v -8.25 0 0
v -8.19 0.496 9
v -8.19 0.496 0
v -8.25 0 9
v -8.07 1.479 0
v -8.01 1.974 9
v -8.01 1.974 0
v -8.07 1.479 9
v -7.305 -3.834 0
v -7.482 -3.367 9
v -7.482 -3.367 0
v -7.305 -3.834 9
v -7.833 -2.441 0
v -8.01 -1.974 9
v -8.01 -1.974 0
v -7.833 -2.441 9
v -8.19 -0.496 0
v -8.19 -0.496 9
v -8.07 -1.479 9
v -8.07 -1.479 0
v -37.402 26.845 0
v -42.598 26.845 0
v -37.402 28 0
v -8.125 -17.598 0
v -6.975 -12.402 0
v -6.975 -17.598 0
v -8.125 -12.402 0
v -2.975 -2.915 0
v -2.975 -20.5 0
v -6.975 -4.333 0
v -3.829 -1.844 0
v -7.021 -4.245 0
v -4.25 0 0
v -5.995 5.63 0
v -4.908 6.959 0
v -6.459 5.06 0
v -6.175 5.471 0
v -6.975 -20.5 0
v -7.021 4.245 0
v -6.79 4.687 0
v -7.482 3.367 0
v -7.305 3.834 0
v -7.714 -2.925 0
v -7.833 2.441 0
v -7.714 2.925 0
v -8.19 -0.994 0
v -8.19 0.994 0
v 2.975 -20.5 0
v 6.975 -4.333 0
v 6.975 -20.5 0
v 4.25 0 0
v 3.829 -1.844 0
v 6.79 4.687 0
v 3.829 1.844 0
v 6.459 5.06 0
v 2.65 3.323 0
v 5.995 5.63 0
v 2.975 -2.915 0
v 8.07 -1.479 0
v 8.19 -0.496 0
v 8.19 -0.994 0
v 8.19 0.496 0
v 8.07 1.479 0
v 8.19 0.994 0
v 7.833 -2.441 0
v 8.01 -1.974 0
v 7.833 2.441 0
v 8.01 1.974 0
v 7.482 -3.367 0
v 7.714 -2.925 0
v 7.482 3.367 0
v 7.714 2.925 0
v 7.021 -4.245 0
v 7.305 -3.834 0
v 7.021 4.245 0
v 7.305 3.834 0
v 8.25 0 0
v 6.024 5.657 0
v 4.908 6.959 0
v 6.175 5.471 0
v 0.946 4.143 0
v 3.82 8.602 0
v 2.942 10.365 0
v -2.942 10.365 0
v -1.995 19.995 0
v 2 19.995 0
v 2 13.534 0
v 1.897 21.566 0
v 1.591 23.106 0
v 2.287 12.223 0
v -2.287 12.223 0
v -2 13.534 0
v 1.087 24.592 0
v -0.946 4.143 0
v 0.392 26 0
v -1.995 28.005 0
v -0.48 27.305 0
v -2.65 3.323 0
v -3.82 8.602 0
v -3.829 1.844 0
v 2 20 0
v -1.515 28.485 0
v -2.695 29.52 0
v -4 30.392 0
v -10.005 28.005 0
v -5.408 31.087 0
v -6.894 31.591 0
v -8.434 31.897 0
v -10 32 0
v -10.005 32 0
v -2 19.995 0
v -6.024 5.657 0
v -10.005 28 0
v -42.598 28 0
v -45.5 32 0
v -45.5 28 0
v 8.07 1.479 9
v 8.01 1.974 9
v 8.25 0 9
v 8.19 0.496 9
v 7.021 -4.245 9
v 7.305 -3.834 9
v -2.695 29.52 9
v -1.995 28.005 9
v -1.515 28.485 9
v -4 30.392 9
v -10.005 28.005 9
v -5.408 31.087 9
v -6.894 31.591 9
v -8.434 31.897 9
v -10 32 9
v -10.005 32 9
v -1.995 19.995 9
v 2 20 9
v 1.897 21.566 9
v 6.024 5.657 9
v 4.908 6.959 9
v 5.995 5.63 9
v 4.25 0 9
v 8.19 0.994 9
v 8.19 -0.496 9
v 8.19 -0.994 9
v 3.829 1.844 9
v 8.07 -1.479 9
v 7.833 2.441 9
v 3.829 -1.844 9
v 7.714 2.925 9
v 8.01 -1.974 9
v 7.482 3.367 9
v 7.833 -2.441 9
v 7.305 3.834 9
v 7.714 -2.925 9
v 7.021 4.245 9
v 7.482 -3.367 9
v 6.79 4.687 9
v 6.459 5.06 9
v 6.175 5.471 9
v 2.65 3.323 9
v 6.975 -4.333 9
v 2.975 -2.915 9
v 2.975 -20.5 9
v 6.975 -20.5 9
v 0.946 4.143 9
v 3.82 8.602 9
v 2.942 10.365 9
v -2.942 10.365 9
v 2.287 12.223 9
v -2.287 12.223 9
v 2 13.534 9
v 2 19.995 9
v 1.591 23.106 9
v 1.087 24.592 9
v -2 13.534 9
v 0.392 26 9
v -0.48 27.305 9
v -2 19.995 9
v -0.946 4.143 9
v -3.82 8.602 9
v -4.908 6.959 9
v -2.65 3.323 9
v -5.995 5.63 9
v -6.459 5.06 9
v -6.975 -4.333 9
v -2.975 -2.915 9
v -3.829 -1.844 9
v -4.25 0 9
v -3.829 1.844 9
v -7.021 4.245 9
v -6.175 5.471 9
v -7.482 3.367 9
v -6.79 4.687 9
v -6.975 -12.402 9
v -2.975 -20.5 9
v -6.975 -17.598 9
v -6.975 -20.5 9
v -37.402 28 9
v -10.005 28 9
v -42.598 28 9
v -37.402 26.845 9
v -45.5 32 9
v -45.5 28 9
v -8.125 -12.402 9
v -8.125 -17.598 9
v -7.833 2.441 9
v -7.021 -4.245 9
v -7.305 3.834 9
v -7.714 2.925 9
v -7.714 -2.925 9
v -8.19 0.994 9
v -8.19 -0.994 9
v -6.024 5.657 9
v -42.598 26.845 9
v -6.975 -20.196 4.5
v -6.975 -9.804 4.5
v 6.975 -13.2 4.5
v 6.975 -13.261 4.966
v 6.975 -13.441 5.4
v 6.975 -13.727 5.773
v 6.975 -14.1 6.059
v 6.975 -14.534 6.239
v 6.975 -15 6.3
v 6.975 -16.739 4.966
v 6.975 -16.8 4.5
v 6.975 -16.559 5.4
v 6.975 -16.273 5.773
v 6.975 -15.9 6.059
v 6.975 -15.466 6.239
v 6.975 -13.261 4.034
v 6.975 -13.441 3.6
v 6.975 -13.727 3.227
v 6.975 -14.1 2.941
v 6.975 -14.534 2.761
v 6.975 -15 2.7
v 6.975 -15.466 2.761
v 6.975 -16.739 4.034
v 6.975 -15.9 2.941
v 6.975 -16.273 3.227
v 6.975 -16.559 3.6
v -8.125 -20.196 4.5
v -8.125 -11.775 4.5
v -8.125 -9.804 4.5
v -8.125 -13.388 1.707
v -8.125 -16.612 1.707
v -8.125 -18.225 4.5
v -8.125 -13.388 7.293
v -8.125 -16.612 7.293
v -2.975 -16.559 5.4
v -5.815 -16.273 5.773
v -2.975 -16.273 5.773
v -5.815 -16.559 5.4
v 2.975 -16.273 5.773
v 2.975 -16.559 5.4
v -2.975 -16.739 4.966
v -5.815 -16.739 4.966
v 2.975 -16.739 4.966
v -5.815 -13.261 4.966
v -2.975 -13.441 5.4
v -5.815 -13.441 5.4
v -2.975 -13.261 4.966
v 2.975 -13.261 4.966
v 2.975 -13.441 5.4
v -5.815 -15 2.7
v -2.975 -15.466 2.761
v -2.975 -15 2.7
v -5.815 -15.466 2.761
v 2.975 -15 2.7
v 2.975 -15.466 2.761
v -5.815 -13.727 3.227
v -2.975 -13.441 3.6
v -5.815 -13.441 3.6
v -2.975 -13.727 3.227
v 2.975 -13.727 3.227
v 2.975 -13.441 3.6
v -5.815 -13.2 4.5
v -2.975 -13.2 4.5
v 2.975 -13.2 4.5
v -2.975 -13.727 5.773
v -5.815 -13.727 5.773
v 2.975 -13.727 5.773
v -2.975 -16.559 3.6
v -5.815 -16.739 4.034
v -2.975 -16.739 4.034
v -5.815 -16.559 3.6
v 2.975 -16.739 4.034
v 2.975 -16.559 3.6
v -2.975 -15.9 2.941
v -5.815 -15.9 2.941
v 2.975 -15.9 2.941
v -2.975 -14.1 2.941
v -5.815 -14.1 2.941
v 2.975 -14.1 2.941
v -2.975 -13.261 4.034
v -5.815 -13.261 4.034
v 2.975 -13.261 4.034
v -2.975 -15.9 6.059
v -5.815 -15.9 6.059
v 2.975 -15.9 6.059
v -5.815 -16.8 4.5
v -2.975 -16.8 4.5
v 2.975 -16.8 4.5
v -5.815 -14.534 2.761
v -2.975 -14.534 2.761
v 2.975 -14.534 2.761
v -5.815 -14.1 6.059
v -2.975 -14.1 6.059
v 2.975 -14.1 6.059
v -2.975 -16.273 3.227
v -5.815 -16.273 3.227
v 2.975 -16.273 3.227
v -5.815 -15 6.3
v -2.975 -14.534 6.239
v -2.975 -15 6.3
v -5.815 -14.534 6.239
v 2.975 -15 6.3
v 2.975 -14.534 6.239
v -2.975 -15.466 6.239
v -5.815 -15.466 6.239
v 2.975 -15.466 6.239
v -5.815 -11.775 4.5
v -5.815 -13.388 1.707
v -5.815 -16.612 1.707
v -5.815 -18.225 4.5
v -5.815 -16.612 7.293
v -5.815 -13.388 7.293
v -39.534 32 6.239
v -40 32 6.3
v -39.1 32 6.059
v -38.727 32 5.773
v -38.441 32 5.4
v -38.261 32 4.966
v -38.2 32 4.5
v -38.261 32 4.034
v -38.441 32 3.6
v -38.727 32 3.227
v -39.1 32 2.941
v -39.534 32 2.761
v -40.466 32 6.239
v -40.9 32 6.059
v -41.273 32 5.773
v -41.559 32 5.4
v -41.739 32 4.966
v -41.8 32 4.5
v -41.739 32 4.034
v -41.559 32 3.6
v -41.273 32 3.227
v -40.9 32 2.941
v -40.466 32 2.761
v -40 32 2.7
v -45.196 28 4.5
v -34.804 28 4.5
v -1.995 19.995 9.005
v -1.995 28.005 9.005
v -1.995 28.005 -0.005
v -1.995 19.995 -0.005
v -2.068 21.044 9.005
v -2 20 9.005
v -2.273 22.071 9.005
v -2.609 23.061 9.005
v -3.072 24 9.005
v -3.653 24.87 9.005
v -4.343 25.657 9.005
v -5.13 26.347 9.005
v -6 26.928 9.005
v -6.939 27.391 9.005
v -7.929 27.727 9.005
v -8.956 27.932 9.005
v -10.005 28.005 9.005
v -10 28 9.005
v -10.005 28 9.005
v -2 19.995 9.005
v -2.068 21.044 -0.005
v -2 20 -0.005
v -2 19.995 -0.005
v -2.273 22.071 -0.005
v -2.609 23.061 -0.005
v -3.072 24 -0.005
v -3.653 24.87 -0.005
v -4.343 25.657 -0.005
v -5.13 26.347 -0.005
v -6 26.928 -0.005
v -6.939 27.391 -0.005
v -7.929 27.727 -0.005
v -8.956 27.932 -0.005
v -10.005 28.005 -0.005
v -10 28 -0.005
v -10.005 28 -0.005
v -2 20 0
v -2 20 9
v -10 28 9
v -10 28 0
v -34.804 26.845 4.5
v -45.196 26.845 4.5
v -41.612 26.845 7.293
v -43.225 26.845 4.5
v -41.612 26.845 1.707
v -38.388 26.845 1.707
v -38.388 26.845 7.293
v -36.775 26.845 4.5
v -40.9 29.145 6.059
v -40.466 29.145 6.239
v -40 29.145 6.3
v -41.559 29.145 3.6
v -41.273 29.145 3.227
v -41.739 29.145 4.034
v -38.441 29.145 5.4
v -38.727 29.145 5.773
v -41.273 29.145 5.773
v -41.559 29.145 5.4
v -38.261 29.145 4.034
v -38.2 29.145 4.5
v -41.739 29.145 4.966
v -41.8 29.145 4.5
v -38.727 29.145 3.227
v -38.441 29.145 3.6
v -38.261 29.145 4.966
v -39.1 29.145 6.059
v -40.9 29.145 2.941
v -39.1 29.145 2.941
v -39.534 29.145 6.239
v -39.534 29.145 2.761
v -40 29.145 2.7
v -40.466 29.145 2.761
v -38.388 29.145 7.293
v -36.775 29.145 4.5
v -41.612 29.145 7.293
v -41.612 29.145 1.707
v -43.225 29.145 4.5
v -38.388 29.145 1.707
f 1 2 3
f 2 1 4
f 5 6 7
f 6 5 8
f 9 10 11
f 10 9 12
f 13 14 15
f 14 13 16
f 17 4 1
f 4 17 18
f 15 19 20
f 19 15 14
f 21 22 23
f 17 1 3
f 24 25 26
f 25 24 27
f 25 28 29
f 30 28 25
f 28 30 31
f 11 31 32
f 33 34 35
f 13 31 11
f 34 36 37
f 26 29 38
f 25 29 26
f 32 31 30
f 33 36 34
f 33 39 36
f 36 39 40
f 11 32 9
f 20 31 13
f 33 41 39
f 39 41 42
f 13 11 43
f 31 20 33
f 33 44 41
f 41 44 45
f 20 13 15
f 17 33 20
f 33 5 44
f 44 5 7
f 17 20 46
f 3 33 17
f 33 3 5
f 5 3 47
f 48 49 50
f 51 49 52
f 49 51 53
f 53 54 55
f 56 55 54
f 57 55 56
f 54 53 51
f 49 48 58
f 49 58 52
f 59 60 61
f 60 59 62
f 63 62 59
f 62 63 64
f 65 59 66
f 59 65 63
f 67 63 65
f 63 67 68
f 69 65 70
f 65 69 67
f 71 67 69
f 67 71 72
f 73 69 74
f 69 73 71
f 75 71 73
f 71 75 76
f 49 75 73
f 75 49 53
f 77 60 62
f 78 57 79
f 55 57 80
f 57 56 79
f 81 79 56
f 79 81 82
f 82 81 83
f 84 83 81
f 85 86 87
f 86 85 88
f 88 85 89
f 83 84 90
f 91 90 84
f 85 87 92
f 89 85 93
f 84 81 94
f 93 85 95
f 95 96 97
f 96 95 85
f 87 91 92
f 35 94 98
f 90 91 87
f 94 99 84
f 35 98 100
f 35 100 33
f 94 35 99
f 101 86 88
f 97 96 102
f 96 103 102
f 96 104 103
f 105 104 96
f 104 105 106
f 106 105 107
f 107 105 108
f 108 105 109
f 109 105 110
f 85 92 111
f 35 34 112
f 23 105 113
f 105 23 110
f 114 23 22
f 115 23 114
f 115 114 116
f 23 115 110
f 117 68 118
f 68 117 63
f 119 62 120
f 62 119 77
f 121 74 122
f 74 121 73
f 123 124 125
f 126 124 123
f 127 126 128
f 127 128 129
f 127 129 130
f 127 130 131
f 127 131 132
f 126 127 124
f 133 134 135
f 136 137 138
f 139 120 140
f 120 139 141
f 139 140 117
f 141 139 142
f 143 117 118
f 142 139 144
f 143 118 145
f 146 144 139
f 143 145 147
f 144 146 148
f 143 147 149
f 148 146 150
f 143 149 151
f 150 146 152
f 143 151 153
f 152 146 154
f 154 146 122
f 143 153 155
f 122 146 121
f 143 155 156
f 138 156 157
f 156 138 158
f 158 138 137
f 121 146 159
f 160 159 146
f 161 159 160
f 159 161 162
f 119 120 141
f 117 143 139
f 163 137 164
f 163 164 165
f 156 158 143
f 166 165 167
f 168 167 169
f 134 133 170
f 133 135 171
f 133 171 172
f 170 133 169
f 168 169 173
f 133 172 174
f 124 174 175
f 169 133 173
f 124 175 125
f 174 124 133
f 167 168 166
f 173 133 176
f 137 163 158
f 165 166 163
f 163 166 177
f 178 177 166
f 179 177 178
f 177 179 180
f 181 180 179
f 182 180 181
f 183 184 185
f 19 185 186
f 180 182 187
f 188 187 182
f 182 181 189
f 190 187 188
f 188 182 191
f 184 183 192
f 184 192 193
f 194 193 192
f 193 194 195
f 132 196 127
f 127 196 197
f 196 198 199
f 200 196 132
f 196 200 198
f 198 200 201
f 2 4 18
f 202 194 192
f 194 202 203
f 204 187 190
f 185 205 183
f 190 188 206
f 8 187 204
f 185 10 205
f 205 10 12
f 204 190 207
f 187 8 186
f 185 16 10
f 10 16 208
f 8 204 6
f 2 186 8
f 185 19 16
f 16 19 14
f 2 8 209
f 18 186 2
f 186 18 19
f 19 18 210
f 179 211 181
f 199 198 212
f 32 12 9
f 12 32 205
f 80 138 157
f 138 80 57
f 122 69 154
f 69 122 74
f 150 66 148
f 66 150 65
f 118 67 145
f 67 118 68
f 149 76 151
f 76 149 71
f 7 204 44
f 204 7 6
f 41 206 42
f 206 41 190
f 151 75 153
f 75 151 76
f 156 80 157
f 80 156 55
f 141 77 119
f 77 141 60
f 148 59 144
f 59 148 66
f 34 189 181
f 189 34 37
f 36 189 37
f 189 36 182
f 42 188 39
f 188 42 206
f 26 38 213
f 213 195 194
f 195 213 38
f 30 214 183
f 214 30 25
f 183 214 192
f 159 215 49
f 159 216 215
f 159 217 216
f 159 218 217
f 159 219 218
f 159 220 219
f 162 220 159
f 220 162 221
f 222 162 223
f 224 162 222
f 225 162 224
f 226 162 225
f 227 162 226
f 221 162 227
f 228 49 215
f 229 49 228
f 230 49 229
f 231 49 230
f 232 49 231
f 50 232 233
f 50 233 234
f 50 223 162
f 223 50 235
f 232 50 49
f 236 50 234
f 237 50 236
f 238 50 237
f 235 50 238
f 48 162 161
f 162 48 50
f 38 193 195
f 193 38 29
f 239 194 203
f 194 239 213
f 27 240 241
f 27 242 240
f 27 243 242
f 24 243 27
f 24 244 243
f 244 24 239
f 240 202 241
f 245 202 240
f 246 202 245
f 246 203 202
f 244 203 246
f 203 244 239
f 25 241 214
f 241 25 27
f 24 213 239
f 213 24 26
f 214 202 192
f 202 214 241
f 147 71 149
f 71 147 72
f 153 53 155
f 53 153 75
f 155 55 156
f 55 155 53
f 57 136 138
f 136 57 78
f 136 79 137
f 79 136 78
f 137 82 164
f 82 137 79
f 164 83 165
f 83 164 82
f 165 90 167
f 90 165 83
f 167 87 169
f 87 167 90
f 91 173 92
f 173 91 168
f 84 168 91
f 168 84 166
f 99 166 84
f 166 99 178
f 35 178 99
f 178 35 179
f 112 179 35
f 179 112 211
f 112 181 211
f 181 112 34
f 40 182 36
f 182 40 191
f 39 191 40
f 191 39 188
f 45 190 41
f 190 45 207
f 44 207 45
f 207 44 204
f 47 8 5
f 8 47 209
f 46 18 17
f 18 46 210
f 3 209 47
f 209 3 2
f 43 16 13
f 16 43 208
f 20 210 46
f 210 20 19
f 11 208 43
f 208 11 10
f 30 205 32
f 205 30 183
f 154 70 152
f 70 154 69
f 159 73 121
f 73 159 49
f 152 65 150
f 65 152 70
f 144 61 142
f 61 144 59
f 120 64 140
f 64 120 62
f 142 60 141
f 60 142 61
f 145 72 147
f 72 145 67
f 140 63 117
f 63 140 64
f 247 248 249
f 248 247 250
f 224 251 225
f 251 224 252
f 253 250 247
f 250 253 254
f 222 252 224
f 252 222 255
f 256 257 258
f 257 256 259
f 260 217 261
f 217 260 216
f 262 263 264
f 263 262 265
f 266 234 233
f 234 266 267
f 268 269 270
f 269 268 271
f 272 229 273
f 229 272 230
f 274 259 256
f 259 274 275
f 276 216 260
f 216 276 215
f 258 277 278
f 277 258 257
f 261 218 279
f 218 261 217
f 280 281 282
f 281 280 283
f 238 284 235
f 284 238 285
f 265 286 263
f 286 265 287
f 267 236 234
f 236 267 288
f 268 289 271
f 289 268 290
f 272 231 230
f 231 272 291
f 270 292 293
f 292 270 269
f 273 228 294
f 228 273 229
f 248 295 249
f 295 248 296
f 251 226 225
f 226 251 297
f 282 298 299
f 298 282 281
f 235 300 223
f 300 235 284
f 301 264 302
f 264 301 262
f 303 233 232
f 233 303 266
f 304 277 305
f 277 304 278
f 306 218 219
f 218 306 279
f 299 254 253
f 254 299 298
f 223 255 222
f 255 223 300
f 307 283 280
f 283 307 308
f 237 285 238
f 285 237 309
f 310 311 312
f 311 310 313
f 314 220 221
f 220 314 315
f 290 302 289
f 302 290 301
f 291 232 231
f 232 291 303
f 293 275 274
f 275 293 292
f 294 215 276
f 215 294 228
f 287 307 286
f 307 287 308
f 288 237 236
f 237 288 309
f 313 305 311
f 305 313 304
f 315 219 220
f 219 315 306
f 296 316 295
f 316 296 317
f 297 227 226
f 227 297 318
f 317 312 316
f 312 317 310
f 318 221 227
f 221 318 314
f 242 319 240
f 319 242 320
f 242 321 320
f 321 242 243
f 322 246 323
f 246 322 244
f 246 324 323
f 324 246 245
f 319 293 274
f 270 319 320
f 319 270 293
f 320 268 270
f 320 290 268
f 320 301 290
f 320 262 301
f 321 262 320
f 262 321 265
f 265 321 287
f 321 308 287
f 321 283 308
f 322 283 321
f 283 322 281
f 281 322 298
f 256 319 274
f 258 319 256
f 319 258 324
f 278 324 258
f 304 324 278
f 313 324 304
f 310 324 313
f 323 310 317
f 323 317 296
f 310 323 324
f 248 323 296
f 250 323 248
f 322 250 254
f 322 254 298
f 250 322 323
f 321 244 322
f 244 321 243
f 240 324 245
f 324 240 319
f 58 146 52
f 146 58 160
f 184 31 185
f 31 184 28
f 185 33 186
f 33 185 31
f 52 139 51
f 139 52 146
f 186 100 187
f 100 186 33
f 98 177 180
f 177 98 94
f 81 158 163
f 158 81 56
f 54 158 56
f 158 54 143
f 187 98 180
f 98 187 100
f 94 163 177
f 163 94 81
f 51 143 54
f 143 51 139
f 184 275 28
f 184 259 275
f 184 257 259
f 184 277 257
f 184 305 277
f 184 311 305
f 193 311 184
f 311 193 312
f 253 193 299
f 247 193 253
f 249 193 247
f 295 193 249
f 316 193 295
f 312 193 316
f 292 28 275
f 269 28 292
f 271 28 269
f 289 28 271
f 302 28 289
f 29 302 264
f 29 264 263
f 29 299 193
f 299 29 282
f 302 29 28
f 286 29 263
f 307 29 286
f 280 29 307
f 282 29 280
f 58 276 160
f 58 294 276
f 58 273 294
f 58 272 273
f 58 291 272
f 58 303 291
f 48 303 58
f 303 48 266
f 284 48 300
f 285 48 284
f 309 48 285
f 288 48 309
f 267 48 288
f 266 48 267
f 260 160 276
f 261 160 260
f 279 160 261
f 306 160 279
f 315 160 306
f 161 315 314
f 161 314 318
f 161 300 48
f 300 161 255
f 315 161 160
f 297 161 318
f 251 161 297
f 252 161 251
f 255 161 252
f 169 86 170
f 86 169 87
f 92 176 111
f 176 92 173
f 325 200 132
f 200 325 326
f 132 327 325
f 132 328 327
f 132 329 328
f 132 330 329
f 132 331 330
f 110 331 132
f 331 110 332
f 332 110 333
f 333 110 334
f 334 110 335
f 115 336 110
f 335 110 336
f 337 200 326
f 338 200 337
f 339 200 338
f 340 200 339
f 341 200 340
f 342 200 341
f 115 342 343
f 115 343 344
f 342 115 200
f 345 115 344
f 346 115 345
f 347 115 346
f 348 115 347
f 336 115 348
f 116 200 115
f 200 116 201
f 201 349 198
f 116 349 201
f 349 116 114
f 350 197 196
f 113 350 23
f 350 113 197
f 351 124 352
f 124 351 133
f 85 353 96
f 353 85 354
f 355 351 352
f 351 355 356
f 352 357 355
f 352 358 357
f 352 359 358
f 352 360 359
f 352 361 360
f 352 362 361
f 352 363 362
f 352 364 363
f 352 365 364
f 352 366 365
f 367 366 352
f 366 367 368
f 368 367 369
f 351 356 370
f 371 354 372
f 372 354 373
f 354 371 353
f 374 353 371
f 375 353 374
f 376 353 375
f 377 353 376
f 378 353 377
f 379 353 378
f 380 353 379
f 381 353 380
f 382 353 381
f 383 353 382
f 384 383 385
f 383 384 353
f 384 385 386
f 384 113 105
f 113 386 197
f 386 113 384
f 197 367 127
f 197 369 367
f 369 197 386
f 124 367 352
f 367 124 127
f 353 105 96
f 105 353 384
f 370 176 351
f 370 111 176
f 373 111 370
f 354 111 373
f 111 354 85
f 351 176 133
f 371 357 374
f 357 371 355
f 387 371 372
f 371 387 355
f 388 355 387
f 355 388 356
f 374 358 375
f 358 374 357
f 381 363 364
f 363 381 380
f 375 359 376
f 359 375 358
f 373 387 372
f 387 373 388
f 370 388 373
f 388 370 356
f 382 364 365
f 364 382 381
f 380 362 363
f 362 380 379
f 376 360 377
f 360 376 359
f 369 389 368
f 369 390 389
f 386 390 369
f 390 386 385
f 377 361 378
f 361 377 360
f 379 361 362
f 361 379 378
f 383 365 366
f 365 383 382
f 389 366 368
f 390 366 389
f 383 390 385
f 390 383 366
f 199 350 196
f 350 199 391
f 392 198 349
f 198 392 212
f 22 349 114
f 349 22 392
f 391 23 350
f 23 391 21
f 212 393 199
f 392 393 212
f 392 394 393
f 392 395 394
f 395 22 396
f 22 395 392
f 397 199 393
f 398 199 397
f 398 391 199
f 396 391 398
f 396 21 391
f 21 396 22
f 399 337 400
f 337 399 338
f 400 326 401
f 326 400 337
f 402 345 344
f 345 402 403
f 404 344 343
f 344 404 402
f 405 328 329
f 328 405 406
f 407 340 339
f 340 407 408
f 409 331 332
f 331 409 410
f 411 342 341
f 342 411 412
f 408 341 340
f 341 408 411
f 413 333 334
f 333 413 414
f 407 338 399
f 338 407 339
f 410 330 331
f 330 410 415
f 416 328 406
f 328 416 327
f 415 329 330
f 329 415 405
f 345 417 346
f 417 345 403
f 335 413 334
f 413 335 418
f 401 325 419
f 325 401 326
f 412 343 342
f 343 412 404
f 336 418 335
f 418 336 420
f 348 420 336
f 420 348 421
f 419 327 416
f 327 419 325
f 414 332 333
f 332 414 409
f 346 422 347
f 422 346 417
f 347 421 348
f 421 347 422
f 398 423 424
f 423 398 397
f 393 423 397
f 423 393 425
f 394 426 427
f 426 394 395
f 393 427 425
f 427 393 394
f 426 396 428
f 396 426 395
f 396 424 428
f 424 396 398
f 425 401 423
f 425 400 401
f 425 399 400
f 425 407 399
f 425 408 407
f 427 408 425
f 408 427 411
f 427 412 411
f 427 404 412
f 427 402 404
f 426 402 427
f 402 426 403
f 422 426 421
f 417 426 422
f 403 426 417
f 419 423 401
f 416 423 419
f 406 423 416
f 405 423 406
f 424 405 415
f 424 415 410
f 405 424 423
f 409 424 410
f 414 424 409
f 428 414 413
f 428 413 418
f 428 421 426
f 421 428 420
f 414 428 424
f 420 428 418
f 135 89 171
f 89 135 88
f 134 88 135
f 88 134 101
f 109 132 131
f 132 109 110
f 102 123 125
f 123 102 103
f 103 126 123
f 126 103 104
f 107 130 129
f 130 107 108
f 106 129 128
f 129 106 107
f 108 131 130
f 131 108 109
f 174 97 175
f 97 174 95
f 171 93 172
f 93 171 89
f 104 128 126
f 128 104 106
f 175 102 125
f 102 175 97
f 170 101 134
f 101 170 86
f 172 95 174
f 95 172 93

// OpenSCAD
// file: barbell.scad
/*
 *  This program is free software; you can redistribute it and/or modify
 *  it under the terms of the GNU General Public License as published by
 *  the Free Software Foundation; either version 3 of the License,
 *  LGPL version 2.1, or (at your option) any later version of the GPL.
 *
 *  This program is distributed in the hope that it will be useful,
 *  but WITHOUT ANY WARRANTY; without even the implied warranty of
 *  MERCHANTABILITY or FITNESS FOR A PARTICULAR PURPOSE.  See the
 *  GNU General Public License for more details.
 *
 *  You should have received a copy of the GNU General Public License
 *  along with this program; if not, write to the Free Software
 *  Foundation, Inc., 59 Temple Place, Suite 330, Boston, MA 02111-1307 USA
 *
*/

module barbell (r1,r2,r3,r4,separation) 
{
	x1=[0,0];
	x2=[separation,0];
	x3=triangulate (x1,x2,r1+r3,r2+r3);
	x4=triangulate (x2,x1,r2+r4,r1+r4);
	render()
	difference ()
	{
		union()
		{
			translate(x1)
			circle (r=r1);
			translate(x2)
			circle(r=r2);
			polygon (points=[x1,x3,x2,x4]);
		}
		translate(x3)
		circle(r=r3,$fa=5);
		translate(x4)
		circle(r=r4,$fa=5);
	}
}


function triangulate (point1, point2, length1, length2) = 
point1 + 
length1*rotated(
atan2(point2[1]-point1[1],point2[0]-point1[0])+
angle(distance(point1,point2),length1,length2));

function distance(point1,point2)=
sqrt((point1[0]-point2[0])*(point1[0]-point2[0])+
(point1[1]-point2[1])*(point1[1]-point2[1]));

function angle(a,b,c) = acos((a*a+b*b-c*c)/(2*a*b)); 

function rotated(a)=[cos(a),sin(a),0];
// file: utilities.scad
/*
 * Utility functions.
 *
 * Originally by Hans Häggström, 2010.
 * Dual licenced under Creative Commons Attribution-Share Alike 3.0 and LGPL2 or later
 */

//include <units.scad>


/******************** Disance Poins ******************************/
function distance3D(a,b) =sqrt( (a[0] - b[0])*(a[0] - b[0]) +
                                (a[1] - b[1])*(a[1] - b[1]) +
                                (a[2] - b[2])*(a[2] - b[2]) );
//Obsolet
function distance(a, b) = distance3D(a,b);

function distance2D(a,b) = sqrt( (a[0] - b[0])*(a[0] - b[0]) +
                                (a[1] - b[1])*(a[1] - b[1]));
								
function distance1D(a,b) = sqrt(a*a+b*b);
//Obsolet
function length2(a) = distance1D(a[0],a[1]);


/************************ vector *************************/
function normalized(a) = a / (max(distance3D([0,0,0], a), 0.00001));

function normalized_axis(a) = a == "x" ? [1, 0, 0]:
                   a == "y" ? [0, 1, 0]:
                   a == "z" ? [0, 0, 1]: normalized(a);

function angleOfNormalizedVector(n) = [0, -atan2(n[2], distance1D([n[0], n[1]])), atan2(n[1], n[0]) ];

function angle(v) = angleOfNormalizedVector(normalized(v));

function angleBetweenTwoPoints(a, b) = angle(normalized(b-a));

function _angleVectore2D(a) = atan2(a[0],a[1]);
function angle_betweentTwoPoints2D (a,b) = _angleVectore2D(b-a);


/********************** Circel ***************************/

function circel_area(r) = PI * r * r;

function circel_radius3Points(a,b,c) = (distance2D(a,b) * distance2D(b,c) * distance2D(c,a)) / (4 * triangle_area3Points(a,b,c));

function circel_radius3lengths(a,b,c) = (a*b*c) / (4 * triangle_area3lengths(a,b,c));


/********************** triangle **************************/
//Satz des Heron
function triangle_area3lengths(a,b,c) = sqrt((a+b+c)*(a+b-c)*(b+c-a)*(c+a-b))/4;

function triangle_area3Points(a,b,c) = triangle_area3lengths(distance2D(a,b),distance2D(b,c),distance2D(c,a));



/************************** coordinate systems translation ****/
//[radius,phi] <=> [x,y]
function conv2D_cartesian2polar(x) = [ distance1D(x[0],x[1]) , atan2(x[1],x[0]) ];
function conv2D_polar2cartesian(x) = [ x[0]*cos(x[1]) , x[0]*sin(x[1]) ];


CENTER = 0;
LEFT = -0.5;
RIGHT = 0.5;
TOP = 0.5;
BOTTOM = -0.5;

FlatCap =0;
ExtendedCap =0.5;
CutCap =-0.5;


module fromTo(from=[0,0,0], to=[1,0,0], size=[1, 1], align=[CENTER, CENTER], material=[0.5, 0.5, 0.5], name="", endExtras=[0,0], endCaps=[FlatCap, FlatCap], rotation=[0,0,0], printString=true) {

  angle = angleBetweenTwoPoints(from, to);
  length = distance(from, to) + endCaps[0]*size[0] + endCaps[1]*size[0] + endExtras[0] + endExtras[1];

  if (length > 0) {
    if (printString) echo(str( "  " ,name, " ", size[0], "mm x ", size[1], "mm, length ", length, "mm"));

    color(material)
      translate(from)
        rotate(angle)
          translate( [ -endCaps[0]*size[0] - endExtras[0], size[0]*(-0.5-align[0]), size[1]*(-0.5+align[1]) ] )
            rotate(rotation)
              scale([length, size[0], size[1]]) child();
  }
}

module part(name) {
  echo("");
  echo(str(name, ":"));
}
// file: roundEdges.scad
/*
 *  Copyright (C) 2012  Krallinger Sebastian
 *
 *  This program is free software; you can redistribute it and/or modify
 *  it under the terms of the GNU General Public License as published by
 *  the Free Software Foundation; either version 3 of the License,
 *  LGPL version 2.1, or (at your option) any later version of the GPL.
 *
 *  This program is distributed in the hope that it will be useful,
 *  but WITHOUT ANY WARRANTY; without even the implied warranty of
 *  MERCHANTABILITY or FITNESS FOR A PARTICULAR PURPOSE.  See the
 *  GNU General Public License for more details.
 *
 *  You should have received a copy of the GNU General Public License
 *  along with this program; if not, write to the Free Software
 *  Foundation, Inc., 59 Temple Place, Suite 330, Boston, MA 02111-1307 USA
 *
*/


//Rounded Edges
module roundEdge(_a=0,_r=1,_l=1,_fn=100){
	rotate (a=[0,0,_a]){
		translate(v=[_r,_r,0]){
			rotate (a=[0,0,0]) rotate (a=[0,0,180]){
				difference() {
					translate (v=[-OS/2,-OS/2,-OS/2])
						cube (size = [_r+OS,_r+OS,_l+OS],center=false );
					translate (v=[0,0,-OS*2/2])
						cylinder (h = _l+OS*2, r=_r, center = false, $fn=_fn);
				}
			}
		}
	}
}
//roundEdge(_a=0,_l=10);
// file: metric.scad
// PRUSA Mendel  
// Default metric sizes
// GNU GPL v2
// Josef Průša
// josefprusa@me.com
// prusadjs.cz
// http://www.reprap.org/wiki/Prusa_Mendel
// http://github.com/prusajr/PrusaMendel

// RODS

threaded_rod_diameter = 8.2;
smooth_bar_diameter = 8;

// Nuts and bolts
// For all nuttraps and screw holse 
m8_diameter = 8.9;
m8_nut_diameter = 15.25;

m4_diameter = 4.5;
m4_nut_diameter = 8.1;
m4_nut_heigth = 3.2;

m3_diameter = 3.6;
m3_nut_diameter = 6.45;
m3_nut_heigth = 2.3;
m3_nut_wallDist = _wallDistFromDia(m3_nut_diameter);
m3_nut_diameter_horizontal = 6.1;

// elongetaed nuttraps
// where a nut is put in an slot and inthere hits the perpendicular threadhole
m3_elongNtt_tolerance = [0.5,0,0.5];// additional [diameter,depth,height]  // depth is not implemented

// linear Bearings
lber_length = 24;
lber_diam = 15.3;

// Motors

motor_shaft = 5.5;


/******************************************************************************/ 
/*                                  INTERNAL                                  */
/******************************************************************************/
/*-----------------!!! do not change things below this !!!--------------------*/
m3_elongNtt_diameter = m3_nut_diameter + m3_elongNtt_tolerance[0];
m3_elongNtt_wallDist = _wallDistFromDia(m3_elongNtt_diameter);
m3_elongNtt_height = m3_nut_heigth + m3_elongNtt_tolerance[2];



function _wallDistFromDia(dia) = cos(30)*dia;
// file: units.scad
/*
 * Basic units.
 * 
 * Originally by Hans Häggström, 2010.
 * Dual licenced under Creative Commons Attribution-Share Alike 3.0 and LGPL2 or later
 */


mm = 1;
cm = 10 * mm;
dm = 100 * mm;
m = 1000 * mm;

inch = 25.4 * mm;

X = [1, 0, 0];
Y = [0, 1, 0];
Z = [0, 0, 1];

M3 = 3*mm;
M4 = 4*mm;
M5 = 5*mm;
M6 = 6*mm;
M8 = 8*mm;


// When a small distance is needed to overlap shapes for boolean cutting, etc.
epsilon = 0.01*mm;
OS = epsilon;  // Over size
// main file
/* pRb-endstop-holder
 * Copyright (c) 2012 by Krallinger Sebastian [s.krallinger+cc@gmail.com]
 * 
 * Creative Commons Attribution-ShareAlike 3.0 (CC BY-SA) [http://creativecommons.org/licenses/by-sa/3.0/]
 * original desing by abdrumm for the PrintrBot
 */

include <units.scad>;
include <metric.scad>
include <roundEdges.scad>
include <utilities.scad>
include <barbell.scad>


/*------------------------------------general---------------------------------*/
mode = "print";  // can be print or inspect [overlays the model with the original model] (uncomment next line)
//mode = "inspect";
//$fn=96;

genWallThickness = 2.5;
strongWallThickness = 5;

horizontalSuportThickness = 0.3;
verticalSupportThickness = 0.5;

/*------------------------------------rod-------------------------------------*/
rod_diam = 8.5;

/*------------------------------------enstop----------------------------------*/
end_height = 9;
end_wallWidth = 4;
end_slotWidth = rod_diam*0.7;
end_slotDepth = 20.5;
end_clampHole_offset = 15;
end_addLengthHole = 5.5;
end_edgeRadius = 10; // availiable ony if perpendicular




// holeOffset is the distance form the center of the axis in the clamp to the center the hole
// nuttraps [clamp, switch connector]  0: off, -1 one side 1 other side
module pRb_endstop_holder(isPerpendicular= 1, holeOffset = [-40,30,5], nuttraps = [1,1]) {
	difference() {
		union(){	
			rotate(a=180,v=Z) 
				_clamp(holeOffset=holeOffset, nuttrap = nuttraps[0]);

			if (isPerpendicular == 0) {
				translate([-end_wallWidth/2, rod_diam/2, 0]) 
					cube(size=[end_wallWidth, holeOffset[1]-rod_diam/2+end_addLengthHole, end_height], center=false);
			}else{
				// normal side
				translate([-end_wallWidth/2, rod_diam/2, 0]) 
					cube(size=[end_wallWidth, holeOffset[1]-rod_diam/2+end_wallWidth/2, end_height], center=false);
				// Perpendicular sied
				if (holeOffset[0]>0) {
					translate([0, holeOffset[1]-end_wallWidth/2, ])
						cube(size=[holeOffset[0]+end_addLengthHole, end_wallWidth, end_height], center=false); 
				}else{
					translate([holeOffset[0]-end_addLengthHole, holeOffset[1]-end_wallWidth/2, ])
						cube(size=[abs(holeOffset[0])+end_addLengthHole, end_wallWidth, end_height], center=false); 
				}
				
			}

			// nuttrap outline
			if (nuttraps[1]!= 0) {
				translate([holeOffset[0], holeOffset[1], end_height/2]) 
				rotate(a=90*isPerpendicular,v=Z)
				rotate(a=-90,v=Y)
				translate([0, 0, end_wallWidth/2*nuttraps[1]]) 
				rotate(a=30,v=Z) 
					cylinder(r=(end_height/2)/cos(30), h=m3_nut_heigth+OS, center=true,$fn=6);
			}

			//rounded edge
			if (isPerpendicular != 0) {
				if (holeOffset[0]>0) {
					translate([end_wallWidth/2, holeOffset[1]-end_wallWidth/2, 0]) 
						roundEdge(_a=-90,_r=end_edgeRadius- end_wallWidth/2,_l=end_height,_fn=48);
				}else{
					translate([-end_wallWidth/2, holeOffset[1]-end_wallWidth/2, 0]) 
						roundEdge(_a=180,_r=end_edgeRadius- end_wallWidth/2,_l=end_height,_fn=48);
				}
			}
			
		}
		union(){
			// switch screw hole and nuttrap
			translate([holeOffset[0], holeOffset[1], end_height/2]) 
			rotate(a=90*isPerpendicular,v=Z)
			rotate(a=-90,v=Y){
				cylinder(r=m3_diameter/2, h=end_wallWidth+2*OS, center=true,$fn=24);
				
				if (nuttraps[1]!= 0) {
					translate([0, 0, (end_wallWidth/2+OS)*nuttraps[1] ]) 
					rotate(a=30,v=Z) 
						cylinder(r=m3_nut_diameter/2, h=m3_nut_heigth+OS, center=true,$fn=6);
				}	
			}

			if (isPerpendicular != 0) {
				if (holeOffset[0]>0) {
					translate([-end_wallWidth/2, holeOffset[1]+end_wallWidth/2, 0]) 
						roundEdge(_a=-90,_r=end_edgeRadius+end_wallWidth/2,_l=end_height,_fn=48);
				}else{
					translate([end_wallWidth/2, holeOffset[1]+end_wallWidth/2, 0]) 
						roundEdge(_a=180,_r=end_edgeRadius+ end_wallWidth/2,_l=end_height,_fn=48);
				}
			}
		}
	}

}

module _clamp(holeOffset,nuttrap) {
	difference() {
		union(){
			cylinder(r=rod_diam/2+end_wallWidth, h=end_height, center=false);
			// slot outline
			translate([-(end_slotWidth+2*end_wallWidth)/2, 0, 0]) 
			cube(size=[end_slotWidth+2*end_wallWidth, end_slotDepth, end_height], center=false);

			//nuttrap
			if (nuttrap != 0) {
				translate([0, end_clampHole_offset, end_height/2]) { // center screw hole
					translate([nuttrap * ((end_slotWidth)/2+end_wallWidth), 0, 0]) 
					rotate(a=90,v=Y) 
					rotate(a=30,v=Z) 
						cylinder(r=(end_height/2)/cos(30), h=m3_nut_heigth, center=true,$fn=6);
				}
			}
			

			// connector

			linear_extrude(height=end_height)
			rotate(a=-90,v=Z) 
				barbell(r1=(rod_diam+2*end_wallWidth)/2,r2=end_wallWidth/2,r3=end_wallWidth*4,r4=end_wallWidth*4,separation=min(20,holeOffset[1]));
		}
		union(){
			// rod coutout
			translate([0, 0, -OS]) 
			cylinder(r=rod_diam/2, h=end_height+2*OS, center=false);
			// slot coutout
			translate([-end_slotWidth/2, 0, -OS]) 
			cube(size=[end_slotWidth, end_slotDepth+OS, end_height+2*OS], center=false);

			
			translate([0, end_clampHole_offset, end_height/2]) { // center screw hole
				// clamp hole
				rotate(a=90,v=Y) 
					cylinder(r=m3_diameter/2, h=end_slotWidth+2*end_wallWidth+2*OS, center=true,$fn=24);
				if (nuttrap != 0) {
					// nuttrap
					translate([nuttrap * ((end_slotWidth)/2+end_wallWidth), 0, 0]) 
					rotate(a=90,v=Y) 
					rotate(a=30,v=Z) 
						cylinder(r=m3_nut_diameter/2, h=m3_nut_heigth+2*OS, center=true,$fn=6);
				}
			}
		}
	}
}
//_clamp();



if (mode == "inspect") {
	pRb_endstop_holder();
}
module pRb_endstop_print() {
	pRb_endstop_holder();
}
if (mode == "print") {
	pRb_endstop_print();
}
